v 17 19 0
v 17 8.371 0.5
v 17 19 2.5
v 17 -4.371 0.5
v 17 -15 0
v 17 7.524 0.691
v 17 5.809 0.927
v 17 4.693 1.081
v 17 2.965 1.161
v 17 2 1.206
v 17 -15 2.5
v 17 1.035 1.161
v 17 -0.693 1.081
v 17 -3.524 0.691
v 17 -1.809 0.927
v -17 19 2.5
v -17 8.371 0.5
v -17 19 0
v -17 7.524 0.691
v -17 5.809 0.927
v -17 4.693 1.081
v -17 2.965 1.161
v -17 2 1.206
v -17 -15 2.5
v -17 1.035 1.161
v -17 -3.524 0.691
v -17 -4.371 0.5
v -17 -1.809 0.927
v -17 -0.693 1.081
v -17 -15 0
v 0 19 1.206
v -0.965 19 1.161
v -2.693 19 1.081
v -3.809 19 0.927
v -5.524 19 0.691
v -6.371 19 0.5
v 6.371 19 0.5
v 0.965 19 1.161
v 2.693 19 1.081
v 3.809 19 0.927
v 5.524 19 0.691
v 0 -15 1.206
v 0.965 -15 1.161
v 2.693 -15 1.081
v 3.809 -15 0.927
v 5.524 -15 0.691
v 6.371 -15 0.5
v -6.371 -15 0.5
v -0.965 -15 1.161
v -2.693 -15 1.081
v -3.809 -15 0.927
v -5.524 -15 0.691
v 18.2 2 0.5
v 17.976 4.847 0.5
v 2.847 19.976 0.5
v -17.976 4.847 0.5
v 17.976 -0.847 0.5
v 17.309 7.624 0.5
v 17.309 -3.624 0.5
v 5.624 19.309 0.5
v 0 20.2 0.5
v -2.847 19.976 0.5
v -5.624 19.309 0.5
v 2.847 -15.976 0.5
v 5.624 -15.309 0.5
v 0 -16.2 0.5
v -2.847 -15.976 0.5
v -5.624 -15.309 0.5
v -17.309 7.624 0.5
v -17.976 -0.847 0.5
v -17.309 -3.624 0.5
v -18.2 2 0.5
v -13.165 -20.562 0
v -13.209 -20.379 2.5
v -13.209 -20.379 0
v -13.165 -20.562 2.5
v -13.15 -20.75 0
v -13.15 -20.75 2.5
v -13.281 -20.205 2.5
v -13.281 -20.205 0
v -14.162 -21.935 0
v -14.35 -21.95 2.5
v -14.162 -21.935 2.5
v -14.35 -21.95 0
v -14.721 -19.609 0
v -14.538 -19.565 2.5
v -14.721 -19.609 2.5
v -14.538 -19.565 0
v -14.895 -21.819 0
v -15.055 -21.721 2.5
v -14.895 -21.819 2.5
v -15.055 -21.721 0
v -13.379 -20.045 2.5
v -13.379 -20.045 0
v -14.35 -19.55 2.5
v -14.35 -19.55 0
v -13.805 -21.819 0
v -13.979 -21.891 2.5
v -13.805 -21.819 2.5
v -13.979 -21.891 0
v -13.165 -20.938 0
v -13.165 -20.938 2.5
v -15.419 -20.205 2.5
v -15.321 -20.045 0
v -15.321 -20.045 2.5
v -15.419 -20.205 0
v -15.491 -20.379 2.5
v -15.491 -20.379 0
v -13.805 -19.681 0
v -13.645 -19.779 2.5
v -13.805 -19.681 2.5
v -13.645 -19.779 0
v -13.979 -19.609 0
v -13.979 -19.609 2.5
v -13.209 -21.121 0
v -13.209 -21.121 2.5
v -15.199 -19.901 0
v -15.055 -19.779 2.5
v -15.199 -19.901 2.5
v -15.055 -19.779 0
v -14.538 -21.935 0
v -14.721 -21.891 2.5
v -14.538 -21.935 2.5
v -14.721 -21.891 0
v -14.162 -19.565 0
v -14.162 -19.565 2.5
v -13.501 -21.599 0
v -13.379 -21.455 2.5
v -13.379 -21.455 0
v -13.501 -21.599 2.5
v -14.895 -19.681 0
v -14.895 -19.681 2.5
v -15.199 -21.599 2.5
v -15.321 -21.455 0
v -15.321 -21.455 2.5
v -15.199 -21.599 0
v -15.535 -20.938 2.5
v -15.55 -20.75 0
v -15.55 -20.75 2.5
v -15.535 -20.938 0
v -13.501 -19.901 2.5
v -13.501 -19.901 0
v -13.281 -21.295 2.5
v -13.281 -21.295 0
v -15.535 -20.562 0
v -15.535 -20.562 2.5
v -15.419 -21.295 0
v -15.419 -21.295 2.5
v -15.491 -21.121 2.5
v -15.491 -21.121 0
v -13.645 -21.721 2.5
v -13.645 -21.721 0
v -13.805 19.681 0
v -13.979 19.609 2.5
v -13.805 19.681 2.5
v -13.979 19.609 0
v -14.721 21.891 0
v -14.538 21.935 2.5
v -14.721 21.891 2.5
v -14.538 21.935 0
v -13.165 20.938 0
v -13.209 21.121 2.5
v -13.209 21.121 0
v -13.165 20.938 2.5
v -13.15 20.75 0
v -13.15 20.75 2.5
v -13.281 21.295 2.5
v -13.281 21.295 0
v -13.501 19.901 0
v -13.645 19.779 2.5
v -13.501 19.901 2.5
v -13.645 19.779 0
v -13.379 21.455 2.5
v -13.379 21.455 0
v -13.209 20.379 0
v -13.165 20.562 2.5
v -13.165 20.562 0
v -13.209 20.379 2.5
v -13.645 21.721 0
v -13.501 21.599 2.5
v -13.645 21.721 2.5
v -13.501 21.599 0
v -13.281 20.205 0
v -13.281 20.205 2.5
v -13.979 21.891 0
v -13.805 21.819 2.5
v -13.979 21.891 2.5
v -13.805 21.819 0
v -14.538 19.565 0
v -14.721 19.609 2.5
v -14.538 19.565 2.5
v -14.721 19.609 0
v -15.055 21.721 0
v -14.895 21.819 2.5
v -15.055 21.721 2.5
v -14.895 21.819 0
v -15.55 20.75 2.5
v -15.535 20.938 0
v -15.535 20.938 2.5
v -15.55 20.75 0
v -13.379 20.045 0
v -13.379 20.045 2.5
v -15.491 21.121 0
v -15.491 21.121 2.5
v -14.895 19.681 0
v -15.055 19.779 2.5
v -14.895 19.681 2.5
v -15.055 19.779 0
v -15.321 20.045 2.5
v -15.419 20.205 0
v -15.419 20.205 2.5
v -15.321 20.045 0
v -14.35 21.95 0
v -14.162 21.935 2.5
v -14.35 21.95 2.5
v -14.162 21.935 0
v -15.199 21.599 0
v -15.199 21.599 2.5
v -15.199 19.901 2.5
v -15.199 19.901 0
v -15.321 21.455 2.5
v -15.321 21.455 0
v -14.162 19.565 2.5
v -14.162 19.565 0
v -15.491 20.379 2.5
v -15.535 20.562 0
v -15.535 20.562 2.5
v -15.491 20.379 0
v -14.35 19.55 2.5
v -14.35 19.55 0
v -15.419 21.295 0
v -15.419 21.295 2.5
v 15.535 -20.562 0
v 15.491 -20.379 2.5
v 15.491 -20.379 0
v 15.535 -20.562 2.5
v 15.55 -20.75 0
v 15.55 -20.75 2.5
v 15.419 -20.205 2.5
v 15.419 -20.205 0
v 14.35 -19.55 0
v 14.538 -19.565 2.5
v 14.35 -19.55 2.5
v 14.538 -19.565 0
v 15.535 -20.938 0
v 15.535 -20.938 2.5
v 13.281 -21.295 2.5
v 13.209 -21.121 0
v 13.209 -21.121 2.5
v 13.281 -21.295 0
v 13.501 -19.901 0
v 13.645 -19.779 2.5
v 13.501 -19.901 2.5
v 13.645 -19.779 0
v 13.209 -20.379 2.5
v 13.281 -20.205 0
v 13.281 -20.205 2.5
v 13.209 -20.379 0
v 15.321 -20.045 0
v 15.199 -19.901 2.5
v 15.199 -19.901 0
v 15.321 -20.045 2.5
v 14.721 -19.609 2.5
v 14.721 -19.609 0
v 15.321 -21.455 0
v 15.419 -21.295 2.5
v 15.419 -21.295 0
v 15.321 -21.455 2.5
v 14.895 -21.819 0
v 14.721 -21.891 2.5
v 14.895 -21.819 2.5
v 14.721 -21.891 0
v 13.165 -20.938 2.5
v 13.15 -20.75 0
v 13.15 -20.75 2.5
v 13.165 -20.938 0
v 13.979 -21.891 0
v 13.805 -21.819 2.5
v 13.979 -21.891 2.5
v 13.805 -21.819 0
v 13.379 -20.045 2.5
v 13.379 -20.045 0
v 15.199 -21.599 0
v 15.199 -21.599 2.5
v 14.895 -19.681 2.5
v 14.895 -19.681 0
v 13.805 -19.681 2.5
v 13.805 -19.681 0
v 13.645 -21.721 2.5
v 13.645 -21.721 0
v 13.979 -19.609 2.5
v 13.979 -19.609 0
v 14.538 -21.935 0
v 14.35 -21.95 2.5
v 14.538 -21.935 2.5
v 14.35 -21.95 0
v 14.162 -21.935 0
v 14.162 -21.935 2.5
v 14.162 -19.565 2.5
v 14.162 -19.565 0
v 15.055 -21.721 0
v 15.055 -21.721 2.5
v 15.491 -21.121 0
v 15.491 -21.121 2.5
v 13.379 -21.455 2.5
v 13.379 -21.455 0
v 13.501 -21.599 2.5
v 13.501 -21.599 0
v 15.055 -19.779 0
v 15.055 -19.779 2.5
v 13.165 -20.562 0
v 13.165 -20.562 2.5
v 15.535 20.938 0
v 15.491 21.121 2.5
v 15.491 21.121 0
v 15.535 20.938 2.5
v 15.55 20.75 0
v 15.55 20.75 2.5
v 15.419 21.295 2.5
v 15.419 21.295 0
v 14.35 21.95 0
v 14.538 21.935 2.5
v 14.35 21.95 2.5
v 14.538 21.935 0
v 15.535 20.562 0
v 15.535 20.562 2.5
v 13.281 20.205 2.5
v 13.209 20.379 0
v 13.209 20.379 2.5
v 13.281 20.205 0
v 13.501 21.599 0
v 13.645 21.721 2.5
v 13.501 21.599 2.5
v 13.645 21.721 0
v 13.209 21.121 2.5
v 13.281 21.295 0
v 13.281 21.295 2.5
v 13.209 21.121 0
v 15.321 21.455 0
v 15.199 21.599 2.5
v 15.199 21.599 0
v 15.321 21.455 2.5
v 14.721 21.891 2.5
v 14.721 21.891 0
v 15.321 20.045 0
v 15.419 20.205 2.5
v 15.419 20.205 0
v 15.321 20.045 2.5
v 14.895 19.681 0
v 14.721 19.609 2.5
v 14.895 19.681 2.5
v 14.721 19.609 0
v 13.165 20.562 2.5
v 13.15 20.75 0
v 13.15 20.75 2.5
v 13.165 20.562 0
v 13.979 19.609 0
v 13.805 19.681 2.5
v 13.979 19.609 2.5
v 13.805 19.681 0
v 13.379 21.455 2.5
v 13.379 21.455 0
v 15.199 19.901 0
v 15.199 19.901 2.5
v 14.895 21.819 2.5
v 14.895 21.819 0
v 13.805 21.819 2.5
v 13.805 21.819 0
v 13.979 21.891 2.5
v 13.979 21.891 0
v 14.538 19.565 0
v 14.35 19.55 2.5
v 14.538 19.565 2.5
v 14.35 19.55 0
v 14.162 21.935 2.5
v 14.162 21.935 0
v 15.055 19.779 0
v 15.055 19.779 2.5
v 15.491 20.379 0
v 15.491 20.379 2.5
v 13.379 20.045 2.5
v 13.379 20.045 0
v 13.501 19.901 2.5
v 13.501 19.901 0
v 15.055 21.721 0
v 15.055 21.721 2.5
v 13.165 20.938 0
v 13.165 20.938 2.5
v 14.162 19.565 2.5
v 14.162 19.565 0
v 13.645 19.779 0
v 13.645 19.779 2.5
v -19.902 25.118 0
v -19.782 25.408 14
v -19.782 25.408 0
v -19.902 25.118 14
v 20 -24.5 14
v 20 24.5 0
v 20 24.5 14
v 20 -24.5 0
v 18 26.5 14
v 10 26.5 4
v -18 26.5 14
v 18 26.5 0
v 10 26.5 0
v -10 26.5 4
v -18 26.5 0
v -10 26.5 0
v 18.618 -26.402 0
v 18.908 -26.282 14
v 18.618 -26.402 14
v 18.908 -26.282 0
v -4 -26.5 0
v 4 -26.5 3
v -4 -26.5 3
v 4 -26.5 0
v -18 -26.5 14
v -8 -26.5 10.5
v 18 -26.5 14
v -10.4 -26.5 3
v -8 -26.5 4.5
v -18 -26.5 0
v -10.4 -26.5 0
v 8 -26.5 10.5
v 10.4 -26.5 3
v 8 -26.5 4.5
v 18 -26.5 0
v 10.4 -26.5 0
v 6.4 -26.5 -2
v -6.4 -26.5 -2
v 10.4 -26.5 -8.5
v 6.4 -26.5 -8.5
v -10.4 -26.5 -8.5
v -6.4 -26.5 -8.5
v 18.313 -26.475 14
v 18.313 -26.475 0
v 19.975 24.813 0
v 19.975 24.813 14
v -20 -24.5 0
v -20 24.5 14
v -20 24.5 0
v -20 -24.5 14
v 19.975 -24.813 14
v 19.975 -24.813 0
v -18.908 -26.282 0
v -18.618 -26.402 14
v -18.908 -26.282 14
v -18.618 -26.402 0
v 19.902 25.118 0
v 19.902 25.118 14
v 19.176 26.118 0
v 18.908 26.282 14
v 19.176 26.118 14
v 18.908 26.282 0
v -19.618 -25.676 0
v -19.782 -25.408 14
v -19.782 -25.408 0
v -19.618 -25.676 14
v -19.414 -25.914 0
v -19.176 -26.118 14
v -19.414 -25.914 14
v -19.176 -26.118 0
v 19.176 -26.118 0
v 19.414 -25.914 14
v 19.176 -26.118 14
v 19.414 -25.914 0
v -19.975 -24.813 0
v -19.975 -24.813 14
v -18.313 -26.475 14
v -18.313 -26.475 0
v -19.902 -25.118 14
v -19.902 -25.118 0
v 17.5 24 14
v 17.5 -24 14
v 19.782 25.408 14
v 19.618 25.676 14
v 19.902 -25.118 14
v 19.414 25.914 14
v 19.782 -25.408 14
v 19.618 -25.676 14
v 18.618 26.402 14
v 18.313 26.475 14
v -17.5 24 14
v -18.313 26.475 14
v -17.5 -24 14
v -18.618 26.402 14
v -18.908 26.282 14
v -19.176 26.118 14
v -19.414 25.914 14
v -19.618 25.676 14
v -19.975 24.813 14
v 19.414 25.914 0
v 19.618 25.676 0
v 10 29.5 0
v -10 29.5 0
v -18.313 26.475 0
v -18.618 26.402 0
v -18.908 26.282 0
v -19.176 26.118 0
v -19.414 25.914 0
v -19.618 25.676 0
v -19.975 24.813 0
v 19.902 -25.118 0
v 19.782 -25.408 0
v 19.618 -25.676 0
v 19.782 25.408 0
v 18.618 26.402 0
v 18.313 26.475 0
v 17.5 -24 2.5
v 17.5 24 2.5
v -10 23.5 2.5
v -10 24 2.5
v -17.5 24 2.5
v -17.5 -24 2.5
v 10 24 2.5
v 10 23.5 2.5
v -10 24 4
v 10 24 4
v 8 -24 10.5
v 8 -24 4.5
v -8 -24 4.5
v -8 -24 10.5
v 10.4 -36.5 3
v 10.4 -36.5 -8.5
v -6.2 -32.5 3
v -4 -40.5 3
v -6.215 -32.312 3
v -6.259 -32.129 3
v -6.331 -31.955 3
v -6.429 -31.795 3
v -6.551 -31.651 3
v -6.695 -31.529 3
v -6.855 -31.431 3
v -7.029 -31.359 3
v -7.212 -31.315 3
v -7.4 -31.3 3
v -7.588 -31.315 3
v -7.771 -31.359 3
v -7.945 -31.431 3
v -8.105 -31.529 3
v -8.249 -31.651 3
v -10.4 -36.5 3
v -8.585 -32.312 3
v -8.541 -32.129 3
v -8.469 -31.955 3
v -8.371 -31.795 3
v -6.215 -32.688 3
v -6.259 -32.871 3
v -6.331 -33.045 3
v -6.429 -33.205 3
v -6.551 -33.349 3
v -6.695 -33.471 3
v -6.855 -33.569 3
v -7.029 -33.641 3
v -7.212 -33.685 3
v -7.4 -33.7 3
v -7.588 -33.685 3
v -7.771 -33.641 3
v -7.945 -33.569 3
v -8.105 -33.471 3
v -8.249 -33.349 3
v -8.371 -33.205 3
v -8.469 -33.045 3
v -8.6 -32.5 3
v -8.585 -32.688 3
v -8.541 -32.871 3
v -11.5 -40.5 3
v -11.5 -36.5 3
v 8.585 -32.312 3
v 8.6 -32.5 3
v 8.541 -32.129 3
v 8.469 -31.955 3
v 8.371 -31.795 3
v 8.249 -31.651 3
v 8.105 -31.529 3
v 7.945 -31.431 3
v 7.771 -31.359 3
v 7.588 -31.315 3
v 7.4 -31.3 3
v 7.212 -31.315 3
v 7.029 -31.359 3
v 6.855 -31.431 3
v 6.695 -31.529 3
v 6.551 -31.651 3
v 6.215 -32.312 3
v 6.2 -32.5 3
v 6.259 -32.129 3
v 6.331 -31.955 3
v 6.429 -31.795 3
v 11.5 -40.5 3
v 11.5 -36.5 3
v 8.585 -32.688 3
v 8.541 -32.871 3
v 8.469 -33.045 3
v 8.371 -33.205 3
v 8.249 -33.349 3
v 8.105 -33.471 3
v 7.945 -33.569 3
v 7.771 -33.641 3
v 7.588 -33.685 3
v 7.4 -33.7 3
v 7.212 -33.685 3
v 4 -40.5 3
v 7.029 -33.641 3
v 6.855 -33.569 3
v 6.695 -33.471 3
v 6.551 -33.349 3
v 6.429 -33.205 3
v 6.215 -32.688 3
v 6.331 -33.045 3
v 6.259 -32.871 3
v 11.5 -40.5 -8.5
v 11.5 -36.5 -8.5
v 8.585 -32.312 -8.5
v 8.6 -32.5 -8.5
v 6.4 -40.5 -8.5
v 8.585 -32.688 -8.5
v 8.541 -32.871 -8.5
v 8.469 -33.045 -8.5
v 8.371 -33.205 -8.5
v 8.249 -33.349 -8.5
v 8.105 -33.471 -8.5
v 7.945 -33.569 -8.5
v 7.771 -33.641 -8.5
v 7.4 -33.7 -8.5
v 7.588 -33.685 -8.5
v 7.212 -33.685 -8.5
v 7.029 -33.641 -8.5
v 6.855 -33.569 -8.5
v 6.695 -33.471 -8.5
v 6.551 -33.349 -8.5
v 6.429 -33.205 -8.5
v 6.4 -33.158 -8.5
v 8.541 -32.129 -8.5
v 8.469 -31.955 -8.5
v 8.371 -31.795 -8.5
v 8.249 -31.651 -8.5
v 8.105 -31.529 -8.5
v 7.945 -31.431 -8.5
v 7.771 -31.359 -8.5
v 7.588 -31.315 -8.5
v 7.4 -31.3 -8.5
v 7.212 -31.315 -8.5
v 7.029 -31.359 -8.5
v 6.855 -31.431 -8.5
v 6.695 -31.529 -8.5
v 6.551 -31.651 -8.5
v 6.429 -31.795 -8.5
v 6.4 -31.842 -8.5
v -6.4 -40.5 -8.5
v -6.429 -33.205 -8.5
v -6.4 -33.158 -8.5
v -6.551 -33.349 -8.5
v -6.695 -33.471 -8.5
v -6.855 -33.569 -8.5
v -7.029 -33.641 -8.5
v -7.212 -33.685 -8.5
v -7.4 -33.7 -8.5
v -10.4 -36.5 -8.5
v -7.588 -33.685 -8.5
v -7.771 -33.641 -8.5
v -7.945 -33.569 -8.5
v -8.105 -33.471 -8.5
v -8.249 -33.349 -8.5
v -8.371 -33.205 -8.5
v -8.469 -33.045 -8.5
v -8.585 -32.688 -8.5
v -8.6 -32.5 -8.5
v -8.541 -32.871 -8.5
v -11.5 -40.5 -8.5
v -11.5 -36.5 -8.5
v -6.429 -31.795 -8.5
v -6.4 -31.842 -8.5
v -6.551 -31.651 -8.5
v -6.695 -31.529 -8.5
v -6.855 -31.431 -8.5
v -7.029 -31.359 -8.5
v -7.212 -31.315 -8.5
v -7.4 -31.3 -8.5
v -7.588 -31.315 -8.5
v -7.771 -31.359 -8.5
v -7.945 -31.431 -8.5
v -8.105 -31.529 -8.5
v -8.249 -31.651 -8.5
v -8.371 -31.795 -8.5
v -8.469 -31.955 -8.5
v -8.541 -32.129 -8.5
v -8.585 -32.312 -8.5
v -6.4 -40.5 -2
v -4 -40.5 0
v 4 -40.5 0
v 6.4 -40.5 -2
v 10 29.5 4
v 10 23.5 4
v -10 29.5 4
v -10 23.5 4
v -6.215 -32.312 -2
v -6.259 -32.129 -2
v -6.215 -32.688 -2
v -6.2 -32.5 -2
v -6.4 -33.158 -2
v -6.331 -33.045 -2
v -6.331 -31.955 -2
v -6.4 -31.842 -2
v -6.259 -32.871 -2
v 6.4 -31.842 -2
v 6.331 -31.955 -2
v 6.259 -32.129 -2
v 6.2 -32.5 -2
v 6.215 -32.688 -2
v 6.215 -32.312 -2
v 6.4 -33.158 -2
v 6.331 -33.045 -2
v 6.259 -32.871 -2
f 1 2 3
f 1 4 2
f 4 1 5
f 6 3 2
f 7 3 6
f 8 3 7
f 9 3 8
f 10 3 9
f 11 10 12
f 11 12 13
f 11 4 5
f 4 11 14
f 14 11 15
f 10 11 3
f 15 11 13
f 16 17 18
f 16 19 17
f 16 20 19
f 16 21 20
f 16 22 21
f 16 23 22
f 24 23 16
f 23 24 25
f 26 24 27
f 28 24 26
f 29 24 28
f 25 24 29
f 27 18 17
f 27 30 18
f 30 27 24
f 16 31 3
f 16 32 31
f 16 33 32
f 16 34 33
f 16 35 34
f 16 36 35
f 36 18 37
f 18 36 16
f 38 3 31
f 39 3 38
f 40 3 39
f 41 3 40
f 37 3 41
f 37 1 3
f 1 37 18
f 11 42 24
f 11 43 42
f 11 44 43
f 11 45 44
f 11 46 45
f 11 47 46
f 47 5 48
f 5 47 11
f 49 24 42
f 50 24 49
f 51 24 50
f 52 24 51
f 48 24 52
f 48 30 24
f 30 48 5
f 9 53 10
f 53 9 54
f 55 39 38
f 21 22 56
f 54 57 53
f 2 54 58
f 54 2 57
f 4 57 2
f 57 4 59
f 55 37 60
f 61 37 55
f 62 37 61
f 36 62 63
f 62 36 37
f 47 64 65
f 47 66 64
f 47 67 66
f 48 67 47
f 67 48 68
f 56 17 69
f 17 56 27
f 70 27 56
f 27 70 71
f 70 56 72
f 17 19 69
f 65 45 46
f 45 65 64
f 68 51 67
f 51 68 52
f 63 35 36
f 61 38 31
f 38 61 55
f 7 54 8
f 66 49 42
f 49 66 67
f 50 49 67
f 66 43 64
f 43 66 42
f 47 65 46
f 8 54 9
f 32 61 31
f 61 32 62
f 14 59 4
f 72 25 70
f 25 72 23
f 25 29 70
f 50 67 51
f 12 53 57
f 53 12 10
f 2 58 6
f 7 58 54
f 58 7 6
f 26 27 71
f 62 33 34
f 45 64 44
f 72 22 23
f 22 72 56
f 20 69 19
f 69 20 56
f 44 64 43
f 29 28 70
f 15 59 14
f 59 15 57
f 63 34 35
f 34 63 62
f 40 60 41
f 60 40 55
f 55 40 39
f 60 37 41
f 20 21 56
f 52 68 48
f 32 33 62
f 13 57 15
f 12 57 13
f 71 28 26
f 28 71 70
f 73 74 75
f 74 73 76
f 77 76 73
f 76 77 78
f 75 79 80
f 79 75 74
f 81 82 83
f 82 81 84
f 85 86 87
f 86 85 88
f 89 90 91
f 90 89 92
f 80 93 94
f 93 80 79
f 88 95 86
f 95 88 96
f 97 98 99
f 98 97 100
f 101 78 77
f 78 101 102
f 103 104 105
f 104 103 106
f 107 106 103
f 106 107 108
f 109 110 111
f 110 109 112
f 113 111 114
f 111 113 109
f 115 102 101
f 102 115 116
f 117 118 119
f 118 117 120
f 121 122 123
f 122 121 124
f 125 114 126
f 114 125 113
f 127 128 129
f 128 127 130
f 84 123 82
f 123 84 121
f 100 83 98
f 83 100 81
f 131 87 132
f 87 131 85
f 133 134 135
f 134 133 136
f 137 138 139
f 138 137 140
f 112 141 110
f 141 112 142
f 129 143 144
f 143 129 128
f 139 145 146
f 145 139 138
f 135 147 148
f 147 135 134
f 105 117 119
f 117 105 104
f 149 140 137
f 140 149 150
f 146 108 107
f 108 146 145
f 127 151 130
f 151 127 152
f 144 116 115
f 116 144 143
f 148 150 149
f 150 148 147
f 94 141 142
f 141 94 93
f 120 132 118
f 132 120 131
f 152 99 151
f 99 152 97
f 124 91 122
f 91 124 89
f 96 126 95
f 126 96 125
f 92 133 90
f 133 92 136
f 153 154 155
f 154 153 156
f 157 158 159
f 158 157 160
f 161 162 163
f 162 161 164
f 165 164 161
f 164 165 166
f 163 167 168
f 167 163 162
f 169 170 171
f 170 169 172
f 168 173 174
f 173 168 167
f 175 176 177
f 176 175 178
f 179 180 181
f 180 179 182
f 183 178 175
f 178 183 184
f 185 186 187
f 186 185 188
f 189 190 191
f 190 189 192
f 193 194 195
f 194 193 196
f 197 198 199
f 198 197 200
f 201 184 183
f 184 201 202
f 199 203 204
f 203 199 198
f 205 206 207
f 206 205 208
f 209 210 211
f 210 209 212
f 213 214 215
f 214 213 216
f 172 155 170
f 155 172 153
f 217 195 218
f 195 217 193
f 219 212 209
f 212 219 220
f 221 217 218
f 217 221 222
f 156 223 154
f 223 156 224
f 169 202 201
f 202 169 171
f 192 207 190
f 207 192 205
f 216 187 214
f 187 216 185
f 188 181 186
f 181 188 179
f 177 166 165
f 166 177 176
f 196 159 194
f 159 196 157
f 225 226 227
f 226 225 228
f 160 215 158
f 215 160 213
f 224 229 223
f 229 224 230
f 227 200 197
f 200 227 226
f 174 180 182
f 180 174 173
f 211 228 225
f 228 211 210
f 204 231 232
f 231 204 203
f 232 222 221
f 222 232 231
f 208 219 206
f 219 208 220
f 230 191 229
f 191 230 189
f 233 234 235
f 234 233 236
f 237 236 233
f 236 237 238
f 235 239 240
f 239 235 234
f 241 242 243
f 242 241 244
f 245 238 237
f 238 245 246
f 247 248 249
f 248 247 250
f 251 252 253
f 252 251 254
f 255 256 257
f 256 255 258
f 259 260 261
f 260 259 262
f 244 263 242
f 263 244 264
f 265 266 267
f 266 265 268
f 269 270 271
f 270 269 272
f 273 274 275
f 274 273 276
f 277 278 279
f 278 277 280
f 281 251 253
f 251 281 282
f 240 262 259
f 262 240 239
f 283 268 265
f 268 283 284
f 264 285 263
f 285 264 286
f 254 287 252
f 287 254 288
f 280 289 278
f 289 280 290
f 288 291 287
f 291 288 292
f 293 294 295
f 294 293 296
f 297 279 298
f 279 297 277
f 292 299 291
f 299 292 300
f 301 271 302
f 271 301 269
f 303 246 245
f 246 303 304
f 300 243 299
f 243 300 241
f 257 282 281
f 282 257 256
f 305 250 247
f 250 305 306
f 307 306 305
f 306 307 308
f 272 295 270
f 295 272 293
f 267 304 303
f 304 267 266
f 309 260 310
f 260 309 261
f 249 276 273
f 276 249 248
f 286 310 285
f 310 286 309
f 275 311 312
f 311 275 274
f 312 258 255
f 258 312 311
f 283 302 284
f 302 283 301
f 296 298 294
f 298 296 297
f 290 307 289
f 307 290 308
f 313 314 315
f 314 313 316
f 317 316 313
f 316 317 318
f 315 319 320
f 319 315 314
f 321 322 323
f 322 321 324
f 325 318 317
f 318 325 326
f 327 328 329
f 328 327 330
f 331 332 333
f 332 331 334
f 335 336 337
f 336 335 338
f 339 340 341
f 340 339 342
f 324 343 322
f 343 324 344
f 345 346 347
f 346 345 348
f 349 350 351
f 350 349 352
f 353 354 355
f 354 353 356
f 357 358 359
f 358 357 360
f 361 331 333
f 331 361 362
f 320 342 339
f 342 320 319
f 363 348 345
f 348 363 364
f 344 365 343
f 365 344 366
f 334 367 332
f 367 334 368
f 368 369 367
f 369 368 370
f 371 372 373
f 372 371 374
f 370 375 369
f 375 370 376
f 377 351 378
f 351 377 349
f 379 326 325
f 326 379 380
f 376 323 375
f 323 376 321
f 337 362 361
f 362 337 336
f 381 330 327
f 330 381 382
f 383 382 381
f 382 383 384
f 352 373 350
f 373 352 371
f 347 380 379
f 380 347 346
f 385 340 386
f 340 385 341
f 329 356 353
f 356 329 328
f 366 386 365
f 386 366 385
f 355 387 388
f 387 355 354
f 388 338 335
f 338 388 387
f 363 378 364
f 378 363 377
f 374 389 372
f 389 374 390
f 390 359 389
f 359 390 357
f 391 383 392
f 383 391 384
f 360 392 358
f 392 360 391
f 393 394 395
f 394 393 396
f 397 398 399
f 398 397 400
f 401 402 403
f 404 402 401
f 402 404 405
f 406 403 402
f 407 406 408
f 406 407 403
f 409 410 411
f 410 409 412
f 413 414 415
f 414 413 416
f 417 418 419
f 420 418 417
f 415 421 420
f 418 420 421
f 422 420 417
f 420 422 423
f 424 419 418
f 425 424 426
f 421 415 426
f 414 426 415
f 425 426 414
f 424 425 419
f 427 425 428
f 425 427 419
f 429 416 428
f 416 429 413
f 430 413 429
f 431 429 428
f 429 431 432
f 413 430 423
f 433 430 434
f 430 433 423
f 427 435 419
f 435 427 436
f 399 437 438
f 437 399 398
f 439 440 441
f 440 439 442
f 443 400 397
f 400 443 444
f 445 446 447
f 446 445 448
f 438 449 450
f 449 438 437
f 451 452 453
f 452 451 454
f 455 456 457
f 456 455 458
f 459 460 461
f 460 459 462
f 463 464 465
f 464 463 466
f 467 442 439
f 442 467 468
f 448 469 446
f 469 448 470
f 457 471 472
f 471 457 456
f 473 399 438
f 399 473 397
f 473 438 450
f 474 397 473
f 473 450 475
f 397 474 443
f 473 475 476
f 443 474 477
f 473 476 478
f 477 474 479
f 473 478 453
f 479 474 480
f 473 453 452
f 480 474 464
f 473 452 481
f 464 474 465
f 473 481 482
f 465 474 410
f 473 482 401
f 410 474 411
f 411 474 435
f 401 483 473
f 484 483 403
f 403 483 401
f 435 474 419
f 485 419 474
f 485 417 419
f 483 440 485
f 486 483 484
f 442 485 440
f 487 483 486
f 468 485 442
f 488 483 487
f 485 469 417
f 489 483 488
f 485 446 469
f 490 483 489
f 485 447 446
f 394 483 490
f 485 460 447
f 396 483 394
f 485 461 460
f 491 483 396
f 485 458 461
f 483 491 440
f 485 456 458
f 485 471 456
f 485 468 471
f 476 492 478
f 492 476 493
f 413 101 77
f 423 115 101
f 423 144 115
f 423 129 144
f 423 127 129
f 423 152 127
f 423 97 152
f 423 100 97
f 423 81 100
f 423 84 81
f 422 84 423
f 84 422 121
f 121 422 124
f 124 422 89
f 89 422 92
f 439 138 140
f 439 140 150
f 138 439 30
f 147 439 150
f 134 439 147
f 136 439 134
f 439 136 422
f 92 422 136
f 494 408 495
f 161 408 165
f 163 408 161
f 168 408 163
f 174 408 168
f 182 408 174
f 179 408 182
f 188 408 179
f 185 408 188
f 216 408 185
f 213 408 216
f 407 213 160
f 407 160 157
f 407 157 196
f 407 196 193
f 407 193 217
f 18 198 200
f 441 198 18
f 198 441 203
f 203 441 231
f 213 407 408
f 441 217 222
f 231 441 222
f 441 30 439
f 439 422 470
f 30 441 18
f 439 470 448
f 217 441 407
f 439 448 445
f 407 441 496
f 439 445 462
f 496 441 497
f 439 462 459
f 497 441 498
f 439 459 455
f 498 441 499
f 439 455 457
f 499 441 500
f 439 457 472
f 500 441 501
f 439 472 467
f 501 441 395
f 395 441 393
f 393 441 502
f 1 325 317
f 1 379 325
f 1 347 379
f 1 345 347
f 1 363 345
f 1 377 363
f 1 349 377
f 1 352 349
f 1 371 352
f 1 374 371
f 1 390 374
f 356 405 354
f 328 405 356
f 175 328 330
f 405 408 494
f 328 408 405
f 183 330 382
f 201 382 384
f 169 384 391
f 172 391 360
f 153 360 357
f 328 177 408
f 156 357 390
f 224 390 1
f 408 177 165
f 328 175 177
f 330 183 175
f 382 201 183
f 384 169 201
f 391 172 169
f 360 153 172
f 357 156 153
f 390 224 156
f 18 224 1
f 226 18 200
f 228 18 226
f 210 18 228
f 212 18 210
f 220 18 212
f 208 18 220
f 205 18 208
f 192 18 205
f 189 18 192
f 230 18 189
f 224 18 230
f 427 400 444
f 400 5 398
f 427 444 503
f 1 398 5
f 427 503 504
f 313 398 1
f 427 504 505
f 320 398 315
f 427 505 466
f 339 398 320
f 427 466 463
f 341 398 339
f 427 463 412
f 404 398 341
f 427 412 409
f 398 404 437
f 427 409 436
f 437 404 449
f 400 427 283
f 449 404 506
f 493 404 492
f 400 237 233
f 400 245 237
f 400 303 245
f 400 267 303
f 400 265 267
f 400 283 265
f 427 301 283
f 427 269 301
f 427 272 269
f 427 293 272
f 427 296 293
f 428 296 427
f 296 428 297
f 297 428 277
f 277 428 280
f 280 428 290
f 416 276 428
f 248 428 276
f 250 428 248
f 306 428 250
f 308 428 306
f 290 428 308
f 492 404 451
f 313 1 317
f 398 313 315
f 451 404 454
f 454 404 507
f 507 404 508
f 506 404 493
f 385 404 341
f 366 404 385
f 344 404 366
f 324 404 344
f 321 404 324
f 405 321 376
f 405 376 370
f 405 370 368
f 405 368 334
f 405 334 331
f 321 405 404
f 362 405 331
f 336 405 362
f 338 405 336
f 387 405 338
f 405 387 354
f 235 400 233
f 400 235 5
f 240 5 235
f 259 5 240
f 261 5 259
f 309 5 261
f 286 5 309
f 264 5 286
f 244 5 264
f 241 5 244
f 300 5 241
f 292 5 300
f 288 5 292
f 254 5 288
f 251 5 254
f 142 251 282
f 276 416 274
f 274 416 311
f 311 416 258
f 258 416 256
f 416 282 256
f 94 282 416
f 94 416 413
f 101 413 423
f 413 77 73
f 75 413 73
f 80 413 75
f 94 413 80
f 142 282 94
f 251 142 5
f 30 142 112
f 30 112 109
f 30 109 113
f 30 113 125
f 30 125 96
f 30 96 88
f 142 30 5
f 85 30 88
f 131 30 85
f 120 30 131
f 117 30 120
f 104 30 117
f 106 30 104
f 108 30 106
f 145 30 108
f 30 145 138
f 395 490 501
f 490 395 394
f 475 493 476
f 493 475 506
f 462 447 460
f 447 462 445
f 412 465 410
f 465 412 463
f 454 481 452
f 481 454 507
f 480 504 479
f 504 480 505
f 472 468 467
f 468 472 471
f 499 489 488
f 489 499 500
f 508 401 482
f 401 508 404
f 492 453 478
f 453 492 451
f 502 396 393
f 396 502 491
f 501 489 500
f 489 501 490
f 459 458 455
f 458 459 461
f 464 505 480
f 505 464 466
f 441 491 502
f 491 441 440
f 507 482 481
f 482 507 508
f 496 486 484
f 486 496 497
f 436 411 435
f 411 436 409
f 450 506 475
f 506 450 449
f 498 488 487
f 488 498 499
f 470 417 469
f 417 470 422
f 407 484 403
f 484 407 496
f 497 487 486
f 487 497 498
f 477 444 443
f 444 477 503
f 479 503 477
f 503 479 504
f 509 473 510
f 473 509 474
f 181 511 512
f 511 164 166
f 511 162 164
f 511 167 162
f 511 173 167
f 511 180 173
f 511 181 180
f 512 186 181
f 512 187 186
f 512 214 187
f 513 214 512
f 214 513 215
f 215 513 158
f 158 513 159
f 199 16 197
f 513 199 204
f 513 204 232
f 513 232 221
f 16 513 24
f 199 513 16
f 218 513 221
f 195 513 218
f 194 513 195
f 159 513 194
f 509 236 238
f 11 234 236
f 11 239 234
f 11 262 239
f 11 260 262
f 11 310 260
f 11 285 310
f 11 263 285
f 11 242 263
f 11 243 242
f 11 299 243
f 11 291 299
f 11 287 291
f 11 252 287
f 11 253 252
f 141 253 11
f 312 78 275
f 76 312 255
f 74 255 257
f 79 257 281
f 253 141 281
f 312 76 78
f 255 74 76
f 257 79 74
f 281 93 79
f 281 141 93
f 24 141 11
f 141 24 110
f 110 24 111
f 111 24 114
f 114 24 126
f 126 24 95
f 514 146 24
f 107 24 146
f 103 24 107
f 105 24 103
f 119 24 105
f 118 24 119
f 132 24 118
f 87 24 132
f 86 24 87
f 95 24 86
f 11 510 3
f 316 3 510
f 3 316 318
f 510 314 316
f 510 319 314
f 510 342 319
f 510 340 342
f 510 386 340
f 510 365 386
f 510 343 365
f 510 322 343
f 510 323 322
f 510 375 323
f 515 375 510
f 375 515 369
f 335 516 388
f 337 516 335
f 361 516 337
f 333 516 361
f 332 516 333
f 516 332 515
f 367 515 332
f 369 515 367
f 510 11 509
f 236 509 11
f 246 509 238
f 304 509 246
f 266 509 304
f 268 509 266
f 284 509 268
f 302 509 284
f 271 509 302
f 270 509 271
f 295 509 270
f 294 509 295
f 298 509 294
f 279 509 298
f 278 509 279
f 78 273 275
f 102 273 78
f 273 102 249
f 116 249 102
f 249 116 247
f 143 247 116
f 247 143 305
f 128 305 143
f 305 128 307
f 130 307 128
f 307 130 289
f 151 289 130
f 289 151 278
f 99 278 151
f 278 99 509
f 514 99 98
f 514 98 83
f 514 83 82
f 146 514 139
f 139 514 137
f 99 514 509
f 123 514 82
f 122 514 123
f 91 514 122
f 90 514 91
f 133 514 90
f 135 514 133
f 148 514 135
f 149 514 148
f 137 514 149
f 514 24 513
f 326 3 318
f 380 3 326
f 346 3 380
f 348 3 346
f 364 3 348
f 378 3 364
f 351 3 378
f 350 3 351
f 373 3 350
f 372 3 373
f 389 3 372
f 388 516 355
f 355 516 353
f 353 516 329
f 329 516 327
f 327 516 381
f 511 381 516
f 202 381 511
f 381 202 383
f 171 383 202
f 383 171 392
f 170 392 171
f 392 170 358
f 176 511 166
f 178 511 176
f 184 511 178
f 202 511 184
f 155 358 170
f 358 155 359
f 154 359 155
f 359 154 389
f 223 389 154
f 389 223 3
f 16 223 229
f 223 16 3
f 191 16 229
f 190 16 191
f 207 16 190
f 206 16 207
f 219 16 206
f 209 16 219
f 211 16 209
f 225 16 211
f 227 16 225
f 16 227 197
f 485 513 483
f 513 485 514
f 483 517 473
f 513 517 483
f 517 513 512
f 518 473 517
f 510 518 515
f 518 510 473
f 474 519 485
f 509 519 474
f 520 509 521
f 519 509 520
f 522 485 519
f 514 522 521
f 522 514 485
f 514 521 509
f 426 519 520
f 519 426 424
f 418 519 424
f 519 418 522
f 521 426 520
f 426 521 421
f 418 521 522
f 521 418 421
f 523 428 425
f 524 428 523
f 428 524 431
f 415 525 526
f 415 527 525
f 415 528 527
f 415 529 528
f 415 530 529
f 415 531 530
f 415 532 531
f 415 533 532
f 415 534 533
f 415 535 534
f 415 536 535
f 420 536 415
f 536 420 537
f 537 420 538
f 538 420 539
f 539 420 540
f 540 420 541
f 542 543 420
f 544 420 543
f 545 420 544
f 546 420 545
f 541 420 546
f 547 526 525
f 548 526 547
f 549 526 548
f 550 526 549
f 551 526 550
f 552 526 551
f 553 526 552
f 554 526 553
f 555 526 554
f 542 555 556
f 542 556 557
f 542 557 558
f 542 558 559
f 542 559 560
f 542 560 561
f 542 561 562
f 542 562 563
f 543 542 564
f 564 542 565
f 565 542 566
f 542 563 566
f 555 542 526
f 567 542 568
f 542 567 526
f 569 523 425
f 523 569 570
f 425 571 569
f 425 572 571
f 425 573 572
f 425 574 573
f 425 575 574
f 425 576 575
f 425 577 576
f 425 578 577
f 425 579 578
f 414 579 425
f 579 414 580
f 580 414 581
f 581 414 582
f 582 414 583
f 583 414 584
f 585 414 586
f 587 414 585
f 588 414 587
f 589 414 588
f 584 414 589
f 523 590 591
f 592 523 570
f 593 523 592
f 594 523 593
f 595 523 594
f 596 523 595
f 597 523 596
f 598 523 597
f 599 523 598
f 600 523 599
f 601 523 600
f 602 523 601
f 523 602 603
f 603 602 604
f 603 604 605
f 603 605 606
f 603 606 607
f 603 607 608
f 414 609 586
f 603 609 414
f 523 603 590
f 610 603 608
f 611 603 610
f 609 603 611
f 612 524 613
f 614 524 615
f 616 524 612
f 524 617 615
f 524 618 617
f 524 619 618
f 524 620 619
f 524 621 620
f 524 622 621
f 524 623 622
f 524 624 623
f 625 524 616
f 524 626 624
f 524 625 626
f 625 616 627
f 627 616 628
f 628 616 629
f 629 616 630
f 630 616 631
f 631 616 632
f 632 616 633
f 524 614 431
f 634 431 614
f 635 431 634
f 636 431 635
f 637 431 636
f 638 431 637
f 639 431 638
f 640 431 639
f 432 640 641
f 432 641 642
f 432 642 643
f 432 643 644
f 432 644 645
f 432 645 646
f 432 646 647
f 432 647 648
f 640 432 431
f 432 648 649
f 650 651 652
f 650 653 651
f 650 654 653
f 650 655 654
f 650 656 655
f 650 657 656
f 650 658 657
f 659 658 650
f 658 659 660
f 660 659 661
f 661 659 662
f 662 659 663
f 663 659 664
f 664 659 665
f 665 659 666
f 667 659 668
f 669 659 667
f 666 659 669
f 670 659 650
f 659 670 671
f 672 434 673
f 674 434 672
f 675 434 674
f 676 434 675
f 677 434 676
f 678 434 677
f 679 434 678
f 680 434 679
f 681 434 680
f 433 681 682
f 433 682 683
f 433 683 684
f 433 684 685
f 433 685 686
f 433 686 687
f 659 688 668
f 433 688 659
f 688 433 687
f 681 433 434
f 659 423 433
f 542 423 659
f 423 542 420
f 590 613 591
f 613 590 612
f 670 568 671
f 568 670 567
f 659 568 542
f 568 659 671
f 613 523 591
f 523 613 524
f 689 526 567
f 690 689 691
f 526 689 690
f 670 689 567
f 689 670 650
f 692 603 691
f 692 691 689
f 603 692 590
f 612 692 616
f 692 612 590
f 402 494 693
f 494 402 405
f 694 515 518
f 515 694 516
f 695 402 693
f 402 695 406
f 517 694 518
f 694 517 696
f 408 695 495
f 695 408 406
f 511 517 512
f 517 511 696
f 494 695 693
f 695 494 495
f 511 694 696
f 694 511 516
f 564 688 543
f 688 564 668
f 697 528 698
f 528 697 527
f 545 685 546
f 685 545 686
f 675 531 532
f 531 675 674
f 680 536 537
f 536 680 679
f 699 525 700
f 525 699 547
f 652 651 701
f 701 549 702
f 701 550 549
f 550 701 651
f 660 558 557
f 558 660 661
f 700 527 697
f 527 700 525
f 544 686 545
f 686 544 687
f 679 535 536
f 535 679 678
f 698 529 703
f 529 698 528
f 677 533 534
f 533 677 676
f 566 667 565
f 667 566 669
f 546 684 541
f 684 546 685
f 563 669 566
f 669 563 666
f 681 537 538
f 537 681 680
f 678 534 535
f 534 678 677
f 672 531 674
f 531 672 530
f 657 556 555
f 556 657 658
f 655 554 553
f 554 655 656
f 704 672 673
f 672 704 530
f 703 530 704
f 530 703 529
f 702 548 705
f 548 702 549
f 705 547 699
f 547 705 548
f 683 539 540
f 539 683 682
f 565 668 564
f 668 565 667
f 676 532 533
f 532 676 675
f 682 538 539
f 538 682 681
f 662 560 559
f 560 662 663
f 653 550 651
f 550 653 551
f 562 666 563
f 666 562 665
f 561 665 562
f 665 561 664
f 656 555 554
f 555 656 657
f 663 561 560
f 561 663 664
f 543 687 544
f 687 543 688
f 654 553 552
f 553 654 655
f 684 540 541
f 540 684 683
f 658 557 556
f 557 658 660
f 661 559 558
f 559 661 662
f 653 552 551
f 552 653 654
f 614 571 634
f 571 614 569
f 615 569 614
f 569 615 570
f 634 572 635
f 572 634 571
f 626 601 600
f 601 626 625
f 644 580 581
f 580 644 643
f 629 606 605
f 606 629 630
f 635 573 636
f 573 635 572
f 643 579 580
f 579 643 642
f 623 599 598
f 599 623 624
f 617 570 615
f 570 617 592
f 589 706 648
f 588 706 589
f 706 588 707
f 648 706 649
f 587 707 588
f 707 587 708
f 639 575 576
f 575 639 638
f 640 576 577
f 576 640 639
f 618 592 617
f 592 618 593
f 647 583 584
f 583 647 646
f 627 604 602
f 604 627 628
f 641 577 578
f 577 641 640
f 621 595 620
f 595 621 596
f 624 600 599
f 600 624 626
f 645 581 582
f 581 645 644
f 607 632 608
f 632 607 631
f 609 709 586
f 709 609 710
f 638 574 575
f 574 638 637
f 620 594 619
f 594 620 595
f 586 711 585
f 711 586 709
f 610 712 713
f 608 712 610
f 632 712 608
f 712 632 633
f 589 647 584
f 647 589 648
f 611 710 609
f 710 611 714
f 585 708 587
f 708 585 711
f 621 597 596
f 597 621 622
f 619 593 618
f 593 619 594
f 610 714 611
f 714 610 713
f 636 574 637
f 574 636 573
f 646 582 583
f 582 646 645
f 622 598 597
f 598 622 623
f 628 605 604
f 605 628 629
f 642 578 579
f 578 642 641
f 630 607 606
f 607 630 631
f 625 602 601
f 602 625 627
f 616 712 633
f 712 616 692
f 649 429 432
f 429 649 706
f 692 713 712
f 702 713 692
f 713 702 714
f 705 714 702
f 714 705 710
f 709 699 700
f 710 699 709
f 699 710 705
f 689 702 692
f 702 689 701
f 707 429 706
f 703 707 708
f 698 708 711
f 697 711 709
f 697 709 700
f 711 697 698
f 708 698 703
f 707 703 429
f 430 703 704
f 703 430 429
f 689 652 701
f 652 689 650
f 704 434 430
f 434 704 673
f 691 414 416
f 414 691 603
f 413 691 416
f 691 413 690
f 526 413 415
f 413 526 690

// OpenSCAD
// =============================================================================
// J.A.R.V.I.S. - MÓDULO CABEÇA DO BRAÇO ROBÓTICO (OLED 1.5" SPI)
// =============================================================================
// Compatível com: Display OLED 1.5" SPI (128x128) - GME128128-01-SPI
// Montagem: Mecanismo de Pulso / Garra de 4-DOF em Acrílico
// Calibrado com medições reais do paquímetro digital:
//   - Largura PCB: 33.8 mm | Comprimento PCB: 47.2 mm
//   - Furação M2: 28.7 mm x 41.5 mm
//   - Encaixe Pulso Braço: 17.2 mm | Entre-furos Garra: 14.8 mm
// =============================================================================

$fn = 40; // Qualidade de curvatura

// --- PARÂMETROS GERAIS ---
folga = 0.5;             // Tolerância de impressão FDM (+0.5mm)
espessura_parede = 2.5;  // Espessura estrutural reforçada

// --- DIMENSÕES DO DISPLAY OLED (CORRIGIDAS COM MARGEM DE ERRO) ---
// Placa real: 34 x 47 mm (com margem de 1mm = 35 x 48 mm)
oled_pcb_w = 35.0;          // Largura interna do berço
oled_pcb_l = 48.0;          // Comprimento interno do berço
oled_pcb_h = 4.0;           // Altura do rebaixo da placa (com vidro)
furos_oled_dx = 28.7;       // Entre-furos largura
furos_oled_dy = 41.5;       // Entre-furos comprimento

// Vidro visível da tela: 34 x 34 mm
janela_oled_w = 34.0;       // Janela visível do display
janela_oled_l = 34.0;

// --- DIMENSÕES DA CAIXA EXTERNA ---
caixa_w = oled_pcb_w + (espessura_parede * 2); // 40.0 mm
caixa_l = oled_pcb_l + (espessura_parede * 2); // 53.0 mm
caixa_profundidade = 14.0;

// --- DIMENSÕES DA BASE DE FIXAÇÃO NA GARRA (SOLICITADO 3mm) ---
bracket_w = 23.0;           // Largura da base da garra
bracket_l = 18.0;           // Comprimento da aba de fixação
bracket_h = 3.0;            // ESPESSURA EXATA DE 3.0 mm SOLICITADA
furos_garra_dist = 14.8;    // Distância entre parafusos M2 da garra acrílica

// =============================================================================
// MÓDULOS PRINCIPAIS
// =============================================================================

module cabeca_oled_frontal() {
    difference() {
        // Bloco externo chanfrado (Design estilo armadura Stark)
        hull() {
            translate([-caixa_w/2 + 2, -caixa_l/2 + 2, 0])
                cylinder(r=2, h=caixa_profundidade);
            translate([caixa_w/2 - 2, -caixa_l/2 + 2, 0])
                cylinder(r=2, h=caixa_profundidade);
            translate([-caixa_w/2 + 2, caixa_l/2 - 2, 0])
                cylinder(r=2, h=caixa_profundidade);
            translate([caixa_w/2 - 2, caixa_l/2 - 2, 0])
                cylinder(r=2, h=caixa_profundidade);
        }

        // Cavidade interna para alojar a PCB e fiação
        translate([-oled_pcb_w/2, -oled_pcb_l/2, espessura_parede])
            cube([oled_pcb_w, oled_pcb_l, caixa_profundidade + 1]);

        // Janela do Display frontal chanfrada (Bezel ergonômico)
        translate([0, 2.0, -0.1]) {
            // Abertura passante
            translate([-janela_oled_w/2, -janela_oled_l/2, 0])
                cube([janela_oled_w, janela_oled_l, espessura_parede + 0.2]);
            
            // Chanfro frontal estético
            translate([0, 0, 0.6])
                rotate([0, 0, 0])
                cylinder(r1=janela_oled_w/2 + 1.2, r2=janela_oled_w/2 - 0.5, h=1.0);
        }

        // 4 Furos de fixação para parafusos M2 da PCB
        for (dx = [-furos_oled_dx/2, furos_oled_dx/2]) {
            for (dy = [-furos_oled_dy/2, furos_oled_dy/2]) {
                translate([dx, dy, -0.5])
                    cylinder(d=2.4, h=espessura_parede + 2); // Furo passante M2
            }
        }

        // Canal inferior para saída do cabo flat/fios SPI
        translate([-8, -caixa_l/2 - 1, espessura_parede + 2])
            cube([16, espessura_parede + 2, 6]);
    }
}

// =============================================================================
// BRACKET ELEVADO (OPÇÃO 2: MONTADO SOBRE A GARRA)
// =============================================================================
// Cria uma ponte que eleva a cabeça OLED 8mm acima da garra, permitindo que
// os dedos e as engrenagens de acrílico se movimentem sem colisão.
// Fixação: 2 parafusos M2 na distância de 14.8 mm + encaixe na base de 23.0 mm.
// =============================================================================

altura_ponte_elevacao = 8.5; // Vão livre para as engrenagens da garra

module bracket_articulacao() {
    difference() {
        union() {
            // Pilares de elevação que descem até a base da garra
            translate([-furos_garra_dist/2 - 3, -caixa_l/2 - 12, -altura_ponte_elevacao])
                cube([furos_garra_dist + 6, 12, altura_ponte_elevacao + bracket_h]);

            // Base de fixação traseira que apoia sobre o suporte do servo (23.0 mm)
            translate([-23.0/2, -caixa_l/2 - 14, -altura_ponte_elevacao])
                cube([23.0, 4.0, altura_ponte_elevacao + bracket_h]);

            // Trilho superior de engate rápido para Câmera / Sensor frontal
            translate([-10, caixa_l/2 - 3, 0])
                cube([20, 6, 4]);
        }

        // Furo dos 2 parafusos M2 da garra (14.8 mm centro a centro)
        translate([-furos_garra_dist/2, -caixa_l/2 - 6, -altura_ponte_elevacao - 1])
            cylinder(d=2.4, h=altura_ponte_elevacao + bracket_h + 2);
        translate([furos_garra_dist/2, -caixa_l/2 - 6, -altura_ponte_elevacao - 1])
            cylinder(d=2.4, h=altura_ponte_elevacao + bracket_h + 2);

        // Vão em túnel para a engrenagem e os dedos da garra girarem livres
        translate([-furos_garra_dist/2 + 1, -caixa_l/2 - 14, -altura_ponte_elevacao - 0.5])
            cube([furos_garra_dist - 2, 16, altura_ponte_elevacao - 1.5]);

        // Canal passa-cabo para o chicote de fios do OLED (7 vias)
        translate([-4, -caixa_l/2 - 15, 0])
            cube([8, 16, bracket_h + 2]);
    }
}

// Tampa traseira com ventilação e clipe de pressão
module tampa_traseira_cabeca() {
    tampa_w = oled_pcb_w - 0.2;
    tampa_l = oled_pcb_l - 0.2;
    tampa_h = 2.0;

    difference() {
        cube([tampa_w, tampa_l, tampa_h], center=true);

        // Fendas de ventilação futuristas
        for (i = [-3 : 3]) {
            translate([0, i * 5, 0])
                cube([tampa_w - 10, 2.0, tampa_h + 1], center=true);
        }

        // Furos M2 para parafusar a tampa na traseira
        for (dx = [-furos_oled_dx/2, furos_oled_dx/2]) {
            for (dy = [-furos_oled_dy/2, furos_oled_dy/2]) {
                translate([dx, dy, 0])
                    cylinder(d=2.6, h=tampa_h + 1, center=true);
            }
        }
    }
}

// =============================================================================
// MONTAGEM FINAL
// =============================================================================

// Peça Principal: Moldura + Bracket Integrado
union() {
    cabeca_oled_frontal();
    bracket_articulacao();
}

// Para visualizar a tampa traseira, descomente a linha abaixo:
// translate([caixa_w + 10, 0, 1]) tampa_traseira_cabeca();
